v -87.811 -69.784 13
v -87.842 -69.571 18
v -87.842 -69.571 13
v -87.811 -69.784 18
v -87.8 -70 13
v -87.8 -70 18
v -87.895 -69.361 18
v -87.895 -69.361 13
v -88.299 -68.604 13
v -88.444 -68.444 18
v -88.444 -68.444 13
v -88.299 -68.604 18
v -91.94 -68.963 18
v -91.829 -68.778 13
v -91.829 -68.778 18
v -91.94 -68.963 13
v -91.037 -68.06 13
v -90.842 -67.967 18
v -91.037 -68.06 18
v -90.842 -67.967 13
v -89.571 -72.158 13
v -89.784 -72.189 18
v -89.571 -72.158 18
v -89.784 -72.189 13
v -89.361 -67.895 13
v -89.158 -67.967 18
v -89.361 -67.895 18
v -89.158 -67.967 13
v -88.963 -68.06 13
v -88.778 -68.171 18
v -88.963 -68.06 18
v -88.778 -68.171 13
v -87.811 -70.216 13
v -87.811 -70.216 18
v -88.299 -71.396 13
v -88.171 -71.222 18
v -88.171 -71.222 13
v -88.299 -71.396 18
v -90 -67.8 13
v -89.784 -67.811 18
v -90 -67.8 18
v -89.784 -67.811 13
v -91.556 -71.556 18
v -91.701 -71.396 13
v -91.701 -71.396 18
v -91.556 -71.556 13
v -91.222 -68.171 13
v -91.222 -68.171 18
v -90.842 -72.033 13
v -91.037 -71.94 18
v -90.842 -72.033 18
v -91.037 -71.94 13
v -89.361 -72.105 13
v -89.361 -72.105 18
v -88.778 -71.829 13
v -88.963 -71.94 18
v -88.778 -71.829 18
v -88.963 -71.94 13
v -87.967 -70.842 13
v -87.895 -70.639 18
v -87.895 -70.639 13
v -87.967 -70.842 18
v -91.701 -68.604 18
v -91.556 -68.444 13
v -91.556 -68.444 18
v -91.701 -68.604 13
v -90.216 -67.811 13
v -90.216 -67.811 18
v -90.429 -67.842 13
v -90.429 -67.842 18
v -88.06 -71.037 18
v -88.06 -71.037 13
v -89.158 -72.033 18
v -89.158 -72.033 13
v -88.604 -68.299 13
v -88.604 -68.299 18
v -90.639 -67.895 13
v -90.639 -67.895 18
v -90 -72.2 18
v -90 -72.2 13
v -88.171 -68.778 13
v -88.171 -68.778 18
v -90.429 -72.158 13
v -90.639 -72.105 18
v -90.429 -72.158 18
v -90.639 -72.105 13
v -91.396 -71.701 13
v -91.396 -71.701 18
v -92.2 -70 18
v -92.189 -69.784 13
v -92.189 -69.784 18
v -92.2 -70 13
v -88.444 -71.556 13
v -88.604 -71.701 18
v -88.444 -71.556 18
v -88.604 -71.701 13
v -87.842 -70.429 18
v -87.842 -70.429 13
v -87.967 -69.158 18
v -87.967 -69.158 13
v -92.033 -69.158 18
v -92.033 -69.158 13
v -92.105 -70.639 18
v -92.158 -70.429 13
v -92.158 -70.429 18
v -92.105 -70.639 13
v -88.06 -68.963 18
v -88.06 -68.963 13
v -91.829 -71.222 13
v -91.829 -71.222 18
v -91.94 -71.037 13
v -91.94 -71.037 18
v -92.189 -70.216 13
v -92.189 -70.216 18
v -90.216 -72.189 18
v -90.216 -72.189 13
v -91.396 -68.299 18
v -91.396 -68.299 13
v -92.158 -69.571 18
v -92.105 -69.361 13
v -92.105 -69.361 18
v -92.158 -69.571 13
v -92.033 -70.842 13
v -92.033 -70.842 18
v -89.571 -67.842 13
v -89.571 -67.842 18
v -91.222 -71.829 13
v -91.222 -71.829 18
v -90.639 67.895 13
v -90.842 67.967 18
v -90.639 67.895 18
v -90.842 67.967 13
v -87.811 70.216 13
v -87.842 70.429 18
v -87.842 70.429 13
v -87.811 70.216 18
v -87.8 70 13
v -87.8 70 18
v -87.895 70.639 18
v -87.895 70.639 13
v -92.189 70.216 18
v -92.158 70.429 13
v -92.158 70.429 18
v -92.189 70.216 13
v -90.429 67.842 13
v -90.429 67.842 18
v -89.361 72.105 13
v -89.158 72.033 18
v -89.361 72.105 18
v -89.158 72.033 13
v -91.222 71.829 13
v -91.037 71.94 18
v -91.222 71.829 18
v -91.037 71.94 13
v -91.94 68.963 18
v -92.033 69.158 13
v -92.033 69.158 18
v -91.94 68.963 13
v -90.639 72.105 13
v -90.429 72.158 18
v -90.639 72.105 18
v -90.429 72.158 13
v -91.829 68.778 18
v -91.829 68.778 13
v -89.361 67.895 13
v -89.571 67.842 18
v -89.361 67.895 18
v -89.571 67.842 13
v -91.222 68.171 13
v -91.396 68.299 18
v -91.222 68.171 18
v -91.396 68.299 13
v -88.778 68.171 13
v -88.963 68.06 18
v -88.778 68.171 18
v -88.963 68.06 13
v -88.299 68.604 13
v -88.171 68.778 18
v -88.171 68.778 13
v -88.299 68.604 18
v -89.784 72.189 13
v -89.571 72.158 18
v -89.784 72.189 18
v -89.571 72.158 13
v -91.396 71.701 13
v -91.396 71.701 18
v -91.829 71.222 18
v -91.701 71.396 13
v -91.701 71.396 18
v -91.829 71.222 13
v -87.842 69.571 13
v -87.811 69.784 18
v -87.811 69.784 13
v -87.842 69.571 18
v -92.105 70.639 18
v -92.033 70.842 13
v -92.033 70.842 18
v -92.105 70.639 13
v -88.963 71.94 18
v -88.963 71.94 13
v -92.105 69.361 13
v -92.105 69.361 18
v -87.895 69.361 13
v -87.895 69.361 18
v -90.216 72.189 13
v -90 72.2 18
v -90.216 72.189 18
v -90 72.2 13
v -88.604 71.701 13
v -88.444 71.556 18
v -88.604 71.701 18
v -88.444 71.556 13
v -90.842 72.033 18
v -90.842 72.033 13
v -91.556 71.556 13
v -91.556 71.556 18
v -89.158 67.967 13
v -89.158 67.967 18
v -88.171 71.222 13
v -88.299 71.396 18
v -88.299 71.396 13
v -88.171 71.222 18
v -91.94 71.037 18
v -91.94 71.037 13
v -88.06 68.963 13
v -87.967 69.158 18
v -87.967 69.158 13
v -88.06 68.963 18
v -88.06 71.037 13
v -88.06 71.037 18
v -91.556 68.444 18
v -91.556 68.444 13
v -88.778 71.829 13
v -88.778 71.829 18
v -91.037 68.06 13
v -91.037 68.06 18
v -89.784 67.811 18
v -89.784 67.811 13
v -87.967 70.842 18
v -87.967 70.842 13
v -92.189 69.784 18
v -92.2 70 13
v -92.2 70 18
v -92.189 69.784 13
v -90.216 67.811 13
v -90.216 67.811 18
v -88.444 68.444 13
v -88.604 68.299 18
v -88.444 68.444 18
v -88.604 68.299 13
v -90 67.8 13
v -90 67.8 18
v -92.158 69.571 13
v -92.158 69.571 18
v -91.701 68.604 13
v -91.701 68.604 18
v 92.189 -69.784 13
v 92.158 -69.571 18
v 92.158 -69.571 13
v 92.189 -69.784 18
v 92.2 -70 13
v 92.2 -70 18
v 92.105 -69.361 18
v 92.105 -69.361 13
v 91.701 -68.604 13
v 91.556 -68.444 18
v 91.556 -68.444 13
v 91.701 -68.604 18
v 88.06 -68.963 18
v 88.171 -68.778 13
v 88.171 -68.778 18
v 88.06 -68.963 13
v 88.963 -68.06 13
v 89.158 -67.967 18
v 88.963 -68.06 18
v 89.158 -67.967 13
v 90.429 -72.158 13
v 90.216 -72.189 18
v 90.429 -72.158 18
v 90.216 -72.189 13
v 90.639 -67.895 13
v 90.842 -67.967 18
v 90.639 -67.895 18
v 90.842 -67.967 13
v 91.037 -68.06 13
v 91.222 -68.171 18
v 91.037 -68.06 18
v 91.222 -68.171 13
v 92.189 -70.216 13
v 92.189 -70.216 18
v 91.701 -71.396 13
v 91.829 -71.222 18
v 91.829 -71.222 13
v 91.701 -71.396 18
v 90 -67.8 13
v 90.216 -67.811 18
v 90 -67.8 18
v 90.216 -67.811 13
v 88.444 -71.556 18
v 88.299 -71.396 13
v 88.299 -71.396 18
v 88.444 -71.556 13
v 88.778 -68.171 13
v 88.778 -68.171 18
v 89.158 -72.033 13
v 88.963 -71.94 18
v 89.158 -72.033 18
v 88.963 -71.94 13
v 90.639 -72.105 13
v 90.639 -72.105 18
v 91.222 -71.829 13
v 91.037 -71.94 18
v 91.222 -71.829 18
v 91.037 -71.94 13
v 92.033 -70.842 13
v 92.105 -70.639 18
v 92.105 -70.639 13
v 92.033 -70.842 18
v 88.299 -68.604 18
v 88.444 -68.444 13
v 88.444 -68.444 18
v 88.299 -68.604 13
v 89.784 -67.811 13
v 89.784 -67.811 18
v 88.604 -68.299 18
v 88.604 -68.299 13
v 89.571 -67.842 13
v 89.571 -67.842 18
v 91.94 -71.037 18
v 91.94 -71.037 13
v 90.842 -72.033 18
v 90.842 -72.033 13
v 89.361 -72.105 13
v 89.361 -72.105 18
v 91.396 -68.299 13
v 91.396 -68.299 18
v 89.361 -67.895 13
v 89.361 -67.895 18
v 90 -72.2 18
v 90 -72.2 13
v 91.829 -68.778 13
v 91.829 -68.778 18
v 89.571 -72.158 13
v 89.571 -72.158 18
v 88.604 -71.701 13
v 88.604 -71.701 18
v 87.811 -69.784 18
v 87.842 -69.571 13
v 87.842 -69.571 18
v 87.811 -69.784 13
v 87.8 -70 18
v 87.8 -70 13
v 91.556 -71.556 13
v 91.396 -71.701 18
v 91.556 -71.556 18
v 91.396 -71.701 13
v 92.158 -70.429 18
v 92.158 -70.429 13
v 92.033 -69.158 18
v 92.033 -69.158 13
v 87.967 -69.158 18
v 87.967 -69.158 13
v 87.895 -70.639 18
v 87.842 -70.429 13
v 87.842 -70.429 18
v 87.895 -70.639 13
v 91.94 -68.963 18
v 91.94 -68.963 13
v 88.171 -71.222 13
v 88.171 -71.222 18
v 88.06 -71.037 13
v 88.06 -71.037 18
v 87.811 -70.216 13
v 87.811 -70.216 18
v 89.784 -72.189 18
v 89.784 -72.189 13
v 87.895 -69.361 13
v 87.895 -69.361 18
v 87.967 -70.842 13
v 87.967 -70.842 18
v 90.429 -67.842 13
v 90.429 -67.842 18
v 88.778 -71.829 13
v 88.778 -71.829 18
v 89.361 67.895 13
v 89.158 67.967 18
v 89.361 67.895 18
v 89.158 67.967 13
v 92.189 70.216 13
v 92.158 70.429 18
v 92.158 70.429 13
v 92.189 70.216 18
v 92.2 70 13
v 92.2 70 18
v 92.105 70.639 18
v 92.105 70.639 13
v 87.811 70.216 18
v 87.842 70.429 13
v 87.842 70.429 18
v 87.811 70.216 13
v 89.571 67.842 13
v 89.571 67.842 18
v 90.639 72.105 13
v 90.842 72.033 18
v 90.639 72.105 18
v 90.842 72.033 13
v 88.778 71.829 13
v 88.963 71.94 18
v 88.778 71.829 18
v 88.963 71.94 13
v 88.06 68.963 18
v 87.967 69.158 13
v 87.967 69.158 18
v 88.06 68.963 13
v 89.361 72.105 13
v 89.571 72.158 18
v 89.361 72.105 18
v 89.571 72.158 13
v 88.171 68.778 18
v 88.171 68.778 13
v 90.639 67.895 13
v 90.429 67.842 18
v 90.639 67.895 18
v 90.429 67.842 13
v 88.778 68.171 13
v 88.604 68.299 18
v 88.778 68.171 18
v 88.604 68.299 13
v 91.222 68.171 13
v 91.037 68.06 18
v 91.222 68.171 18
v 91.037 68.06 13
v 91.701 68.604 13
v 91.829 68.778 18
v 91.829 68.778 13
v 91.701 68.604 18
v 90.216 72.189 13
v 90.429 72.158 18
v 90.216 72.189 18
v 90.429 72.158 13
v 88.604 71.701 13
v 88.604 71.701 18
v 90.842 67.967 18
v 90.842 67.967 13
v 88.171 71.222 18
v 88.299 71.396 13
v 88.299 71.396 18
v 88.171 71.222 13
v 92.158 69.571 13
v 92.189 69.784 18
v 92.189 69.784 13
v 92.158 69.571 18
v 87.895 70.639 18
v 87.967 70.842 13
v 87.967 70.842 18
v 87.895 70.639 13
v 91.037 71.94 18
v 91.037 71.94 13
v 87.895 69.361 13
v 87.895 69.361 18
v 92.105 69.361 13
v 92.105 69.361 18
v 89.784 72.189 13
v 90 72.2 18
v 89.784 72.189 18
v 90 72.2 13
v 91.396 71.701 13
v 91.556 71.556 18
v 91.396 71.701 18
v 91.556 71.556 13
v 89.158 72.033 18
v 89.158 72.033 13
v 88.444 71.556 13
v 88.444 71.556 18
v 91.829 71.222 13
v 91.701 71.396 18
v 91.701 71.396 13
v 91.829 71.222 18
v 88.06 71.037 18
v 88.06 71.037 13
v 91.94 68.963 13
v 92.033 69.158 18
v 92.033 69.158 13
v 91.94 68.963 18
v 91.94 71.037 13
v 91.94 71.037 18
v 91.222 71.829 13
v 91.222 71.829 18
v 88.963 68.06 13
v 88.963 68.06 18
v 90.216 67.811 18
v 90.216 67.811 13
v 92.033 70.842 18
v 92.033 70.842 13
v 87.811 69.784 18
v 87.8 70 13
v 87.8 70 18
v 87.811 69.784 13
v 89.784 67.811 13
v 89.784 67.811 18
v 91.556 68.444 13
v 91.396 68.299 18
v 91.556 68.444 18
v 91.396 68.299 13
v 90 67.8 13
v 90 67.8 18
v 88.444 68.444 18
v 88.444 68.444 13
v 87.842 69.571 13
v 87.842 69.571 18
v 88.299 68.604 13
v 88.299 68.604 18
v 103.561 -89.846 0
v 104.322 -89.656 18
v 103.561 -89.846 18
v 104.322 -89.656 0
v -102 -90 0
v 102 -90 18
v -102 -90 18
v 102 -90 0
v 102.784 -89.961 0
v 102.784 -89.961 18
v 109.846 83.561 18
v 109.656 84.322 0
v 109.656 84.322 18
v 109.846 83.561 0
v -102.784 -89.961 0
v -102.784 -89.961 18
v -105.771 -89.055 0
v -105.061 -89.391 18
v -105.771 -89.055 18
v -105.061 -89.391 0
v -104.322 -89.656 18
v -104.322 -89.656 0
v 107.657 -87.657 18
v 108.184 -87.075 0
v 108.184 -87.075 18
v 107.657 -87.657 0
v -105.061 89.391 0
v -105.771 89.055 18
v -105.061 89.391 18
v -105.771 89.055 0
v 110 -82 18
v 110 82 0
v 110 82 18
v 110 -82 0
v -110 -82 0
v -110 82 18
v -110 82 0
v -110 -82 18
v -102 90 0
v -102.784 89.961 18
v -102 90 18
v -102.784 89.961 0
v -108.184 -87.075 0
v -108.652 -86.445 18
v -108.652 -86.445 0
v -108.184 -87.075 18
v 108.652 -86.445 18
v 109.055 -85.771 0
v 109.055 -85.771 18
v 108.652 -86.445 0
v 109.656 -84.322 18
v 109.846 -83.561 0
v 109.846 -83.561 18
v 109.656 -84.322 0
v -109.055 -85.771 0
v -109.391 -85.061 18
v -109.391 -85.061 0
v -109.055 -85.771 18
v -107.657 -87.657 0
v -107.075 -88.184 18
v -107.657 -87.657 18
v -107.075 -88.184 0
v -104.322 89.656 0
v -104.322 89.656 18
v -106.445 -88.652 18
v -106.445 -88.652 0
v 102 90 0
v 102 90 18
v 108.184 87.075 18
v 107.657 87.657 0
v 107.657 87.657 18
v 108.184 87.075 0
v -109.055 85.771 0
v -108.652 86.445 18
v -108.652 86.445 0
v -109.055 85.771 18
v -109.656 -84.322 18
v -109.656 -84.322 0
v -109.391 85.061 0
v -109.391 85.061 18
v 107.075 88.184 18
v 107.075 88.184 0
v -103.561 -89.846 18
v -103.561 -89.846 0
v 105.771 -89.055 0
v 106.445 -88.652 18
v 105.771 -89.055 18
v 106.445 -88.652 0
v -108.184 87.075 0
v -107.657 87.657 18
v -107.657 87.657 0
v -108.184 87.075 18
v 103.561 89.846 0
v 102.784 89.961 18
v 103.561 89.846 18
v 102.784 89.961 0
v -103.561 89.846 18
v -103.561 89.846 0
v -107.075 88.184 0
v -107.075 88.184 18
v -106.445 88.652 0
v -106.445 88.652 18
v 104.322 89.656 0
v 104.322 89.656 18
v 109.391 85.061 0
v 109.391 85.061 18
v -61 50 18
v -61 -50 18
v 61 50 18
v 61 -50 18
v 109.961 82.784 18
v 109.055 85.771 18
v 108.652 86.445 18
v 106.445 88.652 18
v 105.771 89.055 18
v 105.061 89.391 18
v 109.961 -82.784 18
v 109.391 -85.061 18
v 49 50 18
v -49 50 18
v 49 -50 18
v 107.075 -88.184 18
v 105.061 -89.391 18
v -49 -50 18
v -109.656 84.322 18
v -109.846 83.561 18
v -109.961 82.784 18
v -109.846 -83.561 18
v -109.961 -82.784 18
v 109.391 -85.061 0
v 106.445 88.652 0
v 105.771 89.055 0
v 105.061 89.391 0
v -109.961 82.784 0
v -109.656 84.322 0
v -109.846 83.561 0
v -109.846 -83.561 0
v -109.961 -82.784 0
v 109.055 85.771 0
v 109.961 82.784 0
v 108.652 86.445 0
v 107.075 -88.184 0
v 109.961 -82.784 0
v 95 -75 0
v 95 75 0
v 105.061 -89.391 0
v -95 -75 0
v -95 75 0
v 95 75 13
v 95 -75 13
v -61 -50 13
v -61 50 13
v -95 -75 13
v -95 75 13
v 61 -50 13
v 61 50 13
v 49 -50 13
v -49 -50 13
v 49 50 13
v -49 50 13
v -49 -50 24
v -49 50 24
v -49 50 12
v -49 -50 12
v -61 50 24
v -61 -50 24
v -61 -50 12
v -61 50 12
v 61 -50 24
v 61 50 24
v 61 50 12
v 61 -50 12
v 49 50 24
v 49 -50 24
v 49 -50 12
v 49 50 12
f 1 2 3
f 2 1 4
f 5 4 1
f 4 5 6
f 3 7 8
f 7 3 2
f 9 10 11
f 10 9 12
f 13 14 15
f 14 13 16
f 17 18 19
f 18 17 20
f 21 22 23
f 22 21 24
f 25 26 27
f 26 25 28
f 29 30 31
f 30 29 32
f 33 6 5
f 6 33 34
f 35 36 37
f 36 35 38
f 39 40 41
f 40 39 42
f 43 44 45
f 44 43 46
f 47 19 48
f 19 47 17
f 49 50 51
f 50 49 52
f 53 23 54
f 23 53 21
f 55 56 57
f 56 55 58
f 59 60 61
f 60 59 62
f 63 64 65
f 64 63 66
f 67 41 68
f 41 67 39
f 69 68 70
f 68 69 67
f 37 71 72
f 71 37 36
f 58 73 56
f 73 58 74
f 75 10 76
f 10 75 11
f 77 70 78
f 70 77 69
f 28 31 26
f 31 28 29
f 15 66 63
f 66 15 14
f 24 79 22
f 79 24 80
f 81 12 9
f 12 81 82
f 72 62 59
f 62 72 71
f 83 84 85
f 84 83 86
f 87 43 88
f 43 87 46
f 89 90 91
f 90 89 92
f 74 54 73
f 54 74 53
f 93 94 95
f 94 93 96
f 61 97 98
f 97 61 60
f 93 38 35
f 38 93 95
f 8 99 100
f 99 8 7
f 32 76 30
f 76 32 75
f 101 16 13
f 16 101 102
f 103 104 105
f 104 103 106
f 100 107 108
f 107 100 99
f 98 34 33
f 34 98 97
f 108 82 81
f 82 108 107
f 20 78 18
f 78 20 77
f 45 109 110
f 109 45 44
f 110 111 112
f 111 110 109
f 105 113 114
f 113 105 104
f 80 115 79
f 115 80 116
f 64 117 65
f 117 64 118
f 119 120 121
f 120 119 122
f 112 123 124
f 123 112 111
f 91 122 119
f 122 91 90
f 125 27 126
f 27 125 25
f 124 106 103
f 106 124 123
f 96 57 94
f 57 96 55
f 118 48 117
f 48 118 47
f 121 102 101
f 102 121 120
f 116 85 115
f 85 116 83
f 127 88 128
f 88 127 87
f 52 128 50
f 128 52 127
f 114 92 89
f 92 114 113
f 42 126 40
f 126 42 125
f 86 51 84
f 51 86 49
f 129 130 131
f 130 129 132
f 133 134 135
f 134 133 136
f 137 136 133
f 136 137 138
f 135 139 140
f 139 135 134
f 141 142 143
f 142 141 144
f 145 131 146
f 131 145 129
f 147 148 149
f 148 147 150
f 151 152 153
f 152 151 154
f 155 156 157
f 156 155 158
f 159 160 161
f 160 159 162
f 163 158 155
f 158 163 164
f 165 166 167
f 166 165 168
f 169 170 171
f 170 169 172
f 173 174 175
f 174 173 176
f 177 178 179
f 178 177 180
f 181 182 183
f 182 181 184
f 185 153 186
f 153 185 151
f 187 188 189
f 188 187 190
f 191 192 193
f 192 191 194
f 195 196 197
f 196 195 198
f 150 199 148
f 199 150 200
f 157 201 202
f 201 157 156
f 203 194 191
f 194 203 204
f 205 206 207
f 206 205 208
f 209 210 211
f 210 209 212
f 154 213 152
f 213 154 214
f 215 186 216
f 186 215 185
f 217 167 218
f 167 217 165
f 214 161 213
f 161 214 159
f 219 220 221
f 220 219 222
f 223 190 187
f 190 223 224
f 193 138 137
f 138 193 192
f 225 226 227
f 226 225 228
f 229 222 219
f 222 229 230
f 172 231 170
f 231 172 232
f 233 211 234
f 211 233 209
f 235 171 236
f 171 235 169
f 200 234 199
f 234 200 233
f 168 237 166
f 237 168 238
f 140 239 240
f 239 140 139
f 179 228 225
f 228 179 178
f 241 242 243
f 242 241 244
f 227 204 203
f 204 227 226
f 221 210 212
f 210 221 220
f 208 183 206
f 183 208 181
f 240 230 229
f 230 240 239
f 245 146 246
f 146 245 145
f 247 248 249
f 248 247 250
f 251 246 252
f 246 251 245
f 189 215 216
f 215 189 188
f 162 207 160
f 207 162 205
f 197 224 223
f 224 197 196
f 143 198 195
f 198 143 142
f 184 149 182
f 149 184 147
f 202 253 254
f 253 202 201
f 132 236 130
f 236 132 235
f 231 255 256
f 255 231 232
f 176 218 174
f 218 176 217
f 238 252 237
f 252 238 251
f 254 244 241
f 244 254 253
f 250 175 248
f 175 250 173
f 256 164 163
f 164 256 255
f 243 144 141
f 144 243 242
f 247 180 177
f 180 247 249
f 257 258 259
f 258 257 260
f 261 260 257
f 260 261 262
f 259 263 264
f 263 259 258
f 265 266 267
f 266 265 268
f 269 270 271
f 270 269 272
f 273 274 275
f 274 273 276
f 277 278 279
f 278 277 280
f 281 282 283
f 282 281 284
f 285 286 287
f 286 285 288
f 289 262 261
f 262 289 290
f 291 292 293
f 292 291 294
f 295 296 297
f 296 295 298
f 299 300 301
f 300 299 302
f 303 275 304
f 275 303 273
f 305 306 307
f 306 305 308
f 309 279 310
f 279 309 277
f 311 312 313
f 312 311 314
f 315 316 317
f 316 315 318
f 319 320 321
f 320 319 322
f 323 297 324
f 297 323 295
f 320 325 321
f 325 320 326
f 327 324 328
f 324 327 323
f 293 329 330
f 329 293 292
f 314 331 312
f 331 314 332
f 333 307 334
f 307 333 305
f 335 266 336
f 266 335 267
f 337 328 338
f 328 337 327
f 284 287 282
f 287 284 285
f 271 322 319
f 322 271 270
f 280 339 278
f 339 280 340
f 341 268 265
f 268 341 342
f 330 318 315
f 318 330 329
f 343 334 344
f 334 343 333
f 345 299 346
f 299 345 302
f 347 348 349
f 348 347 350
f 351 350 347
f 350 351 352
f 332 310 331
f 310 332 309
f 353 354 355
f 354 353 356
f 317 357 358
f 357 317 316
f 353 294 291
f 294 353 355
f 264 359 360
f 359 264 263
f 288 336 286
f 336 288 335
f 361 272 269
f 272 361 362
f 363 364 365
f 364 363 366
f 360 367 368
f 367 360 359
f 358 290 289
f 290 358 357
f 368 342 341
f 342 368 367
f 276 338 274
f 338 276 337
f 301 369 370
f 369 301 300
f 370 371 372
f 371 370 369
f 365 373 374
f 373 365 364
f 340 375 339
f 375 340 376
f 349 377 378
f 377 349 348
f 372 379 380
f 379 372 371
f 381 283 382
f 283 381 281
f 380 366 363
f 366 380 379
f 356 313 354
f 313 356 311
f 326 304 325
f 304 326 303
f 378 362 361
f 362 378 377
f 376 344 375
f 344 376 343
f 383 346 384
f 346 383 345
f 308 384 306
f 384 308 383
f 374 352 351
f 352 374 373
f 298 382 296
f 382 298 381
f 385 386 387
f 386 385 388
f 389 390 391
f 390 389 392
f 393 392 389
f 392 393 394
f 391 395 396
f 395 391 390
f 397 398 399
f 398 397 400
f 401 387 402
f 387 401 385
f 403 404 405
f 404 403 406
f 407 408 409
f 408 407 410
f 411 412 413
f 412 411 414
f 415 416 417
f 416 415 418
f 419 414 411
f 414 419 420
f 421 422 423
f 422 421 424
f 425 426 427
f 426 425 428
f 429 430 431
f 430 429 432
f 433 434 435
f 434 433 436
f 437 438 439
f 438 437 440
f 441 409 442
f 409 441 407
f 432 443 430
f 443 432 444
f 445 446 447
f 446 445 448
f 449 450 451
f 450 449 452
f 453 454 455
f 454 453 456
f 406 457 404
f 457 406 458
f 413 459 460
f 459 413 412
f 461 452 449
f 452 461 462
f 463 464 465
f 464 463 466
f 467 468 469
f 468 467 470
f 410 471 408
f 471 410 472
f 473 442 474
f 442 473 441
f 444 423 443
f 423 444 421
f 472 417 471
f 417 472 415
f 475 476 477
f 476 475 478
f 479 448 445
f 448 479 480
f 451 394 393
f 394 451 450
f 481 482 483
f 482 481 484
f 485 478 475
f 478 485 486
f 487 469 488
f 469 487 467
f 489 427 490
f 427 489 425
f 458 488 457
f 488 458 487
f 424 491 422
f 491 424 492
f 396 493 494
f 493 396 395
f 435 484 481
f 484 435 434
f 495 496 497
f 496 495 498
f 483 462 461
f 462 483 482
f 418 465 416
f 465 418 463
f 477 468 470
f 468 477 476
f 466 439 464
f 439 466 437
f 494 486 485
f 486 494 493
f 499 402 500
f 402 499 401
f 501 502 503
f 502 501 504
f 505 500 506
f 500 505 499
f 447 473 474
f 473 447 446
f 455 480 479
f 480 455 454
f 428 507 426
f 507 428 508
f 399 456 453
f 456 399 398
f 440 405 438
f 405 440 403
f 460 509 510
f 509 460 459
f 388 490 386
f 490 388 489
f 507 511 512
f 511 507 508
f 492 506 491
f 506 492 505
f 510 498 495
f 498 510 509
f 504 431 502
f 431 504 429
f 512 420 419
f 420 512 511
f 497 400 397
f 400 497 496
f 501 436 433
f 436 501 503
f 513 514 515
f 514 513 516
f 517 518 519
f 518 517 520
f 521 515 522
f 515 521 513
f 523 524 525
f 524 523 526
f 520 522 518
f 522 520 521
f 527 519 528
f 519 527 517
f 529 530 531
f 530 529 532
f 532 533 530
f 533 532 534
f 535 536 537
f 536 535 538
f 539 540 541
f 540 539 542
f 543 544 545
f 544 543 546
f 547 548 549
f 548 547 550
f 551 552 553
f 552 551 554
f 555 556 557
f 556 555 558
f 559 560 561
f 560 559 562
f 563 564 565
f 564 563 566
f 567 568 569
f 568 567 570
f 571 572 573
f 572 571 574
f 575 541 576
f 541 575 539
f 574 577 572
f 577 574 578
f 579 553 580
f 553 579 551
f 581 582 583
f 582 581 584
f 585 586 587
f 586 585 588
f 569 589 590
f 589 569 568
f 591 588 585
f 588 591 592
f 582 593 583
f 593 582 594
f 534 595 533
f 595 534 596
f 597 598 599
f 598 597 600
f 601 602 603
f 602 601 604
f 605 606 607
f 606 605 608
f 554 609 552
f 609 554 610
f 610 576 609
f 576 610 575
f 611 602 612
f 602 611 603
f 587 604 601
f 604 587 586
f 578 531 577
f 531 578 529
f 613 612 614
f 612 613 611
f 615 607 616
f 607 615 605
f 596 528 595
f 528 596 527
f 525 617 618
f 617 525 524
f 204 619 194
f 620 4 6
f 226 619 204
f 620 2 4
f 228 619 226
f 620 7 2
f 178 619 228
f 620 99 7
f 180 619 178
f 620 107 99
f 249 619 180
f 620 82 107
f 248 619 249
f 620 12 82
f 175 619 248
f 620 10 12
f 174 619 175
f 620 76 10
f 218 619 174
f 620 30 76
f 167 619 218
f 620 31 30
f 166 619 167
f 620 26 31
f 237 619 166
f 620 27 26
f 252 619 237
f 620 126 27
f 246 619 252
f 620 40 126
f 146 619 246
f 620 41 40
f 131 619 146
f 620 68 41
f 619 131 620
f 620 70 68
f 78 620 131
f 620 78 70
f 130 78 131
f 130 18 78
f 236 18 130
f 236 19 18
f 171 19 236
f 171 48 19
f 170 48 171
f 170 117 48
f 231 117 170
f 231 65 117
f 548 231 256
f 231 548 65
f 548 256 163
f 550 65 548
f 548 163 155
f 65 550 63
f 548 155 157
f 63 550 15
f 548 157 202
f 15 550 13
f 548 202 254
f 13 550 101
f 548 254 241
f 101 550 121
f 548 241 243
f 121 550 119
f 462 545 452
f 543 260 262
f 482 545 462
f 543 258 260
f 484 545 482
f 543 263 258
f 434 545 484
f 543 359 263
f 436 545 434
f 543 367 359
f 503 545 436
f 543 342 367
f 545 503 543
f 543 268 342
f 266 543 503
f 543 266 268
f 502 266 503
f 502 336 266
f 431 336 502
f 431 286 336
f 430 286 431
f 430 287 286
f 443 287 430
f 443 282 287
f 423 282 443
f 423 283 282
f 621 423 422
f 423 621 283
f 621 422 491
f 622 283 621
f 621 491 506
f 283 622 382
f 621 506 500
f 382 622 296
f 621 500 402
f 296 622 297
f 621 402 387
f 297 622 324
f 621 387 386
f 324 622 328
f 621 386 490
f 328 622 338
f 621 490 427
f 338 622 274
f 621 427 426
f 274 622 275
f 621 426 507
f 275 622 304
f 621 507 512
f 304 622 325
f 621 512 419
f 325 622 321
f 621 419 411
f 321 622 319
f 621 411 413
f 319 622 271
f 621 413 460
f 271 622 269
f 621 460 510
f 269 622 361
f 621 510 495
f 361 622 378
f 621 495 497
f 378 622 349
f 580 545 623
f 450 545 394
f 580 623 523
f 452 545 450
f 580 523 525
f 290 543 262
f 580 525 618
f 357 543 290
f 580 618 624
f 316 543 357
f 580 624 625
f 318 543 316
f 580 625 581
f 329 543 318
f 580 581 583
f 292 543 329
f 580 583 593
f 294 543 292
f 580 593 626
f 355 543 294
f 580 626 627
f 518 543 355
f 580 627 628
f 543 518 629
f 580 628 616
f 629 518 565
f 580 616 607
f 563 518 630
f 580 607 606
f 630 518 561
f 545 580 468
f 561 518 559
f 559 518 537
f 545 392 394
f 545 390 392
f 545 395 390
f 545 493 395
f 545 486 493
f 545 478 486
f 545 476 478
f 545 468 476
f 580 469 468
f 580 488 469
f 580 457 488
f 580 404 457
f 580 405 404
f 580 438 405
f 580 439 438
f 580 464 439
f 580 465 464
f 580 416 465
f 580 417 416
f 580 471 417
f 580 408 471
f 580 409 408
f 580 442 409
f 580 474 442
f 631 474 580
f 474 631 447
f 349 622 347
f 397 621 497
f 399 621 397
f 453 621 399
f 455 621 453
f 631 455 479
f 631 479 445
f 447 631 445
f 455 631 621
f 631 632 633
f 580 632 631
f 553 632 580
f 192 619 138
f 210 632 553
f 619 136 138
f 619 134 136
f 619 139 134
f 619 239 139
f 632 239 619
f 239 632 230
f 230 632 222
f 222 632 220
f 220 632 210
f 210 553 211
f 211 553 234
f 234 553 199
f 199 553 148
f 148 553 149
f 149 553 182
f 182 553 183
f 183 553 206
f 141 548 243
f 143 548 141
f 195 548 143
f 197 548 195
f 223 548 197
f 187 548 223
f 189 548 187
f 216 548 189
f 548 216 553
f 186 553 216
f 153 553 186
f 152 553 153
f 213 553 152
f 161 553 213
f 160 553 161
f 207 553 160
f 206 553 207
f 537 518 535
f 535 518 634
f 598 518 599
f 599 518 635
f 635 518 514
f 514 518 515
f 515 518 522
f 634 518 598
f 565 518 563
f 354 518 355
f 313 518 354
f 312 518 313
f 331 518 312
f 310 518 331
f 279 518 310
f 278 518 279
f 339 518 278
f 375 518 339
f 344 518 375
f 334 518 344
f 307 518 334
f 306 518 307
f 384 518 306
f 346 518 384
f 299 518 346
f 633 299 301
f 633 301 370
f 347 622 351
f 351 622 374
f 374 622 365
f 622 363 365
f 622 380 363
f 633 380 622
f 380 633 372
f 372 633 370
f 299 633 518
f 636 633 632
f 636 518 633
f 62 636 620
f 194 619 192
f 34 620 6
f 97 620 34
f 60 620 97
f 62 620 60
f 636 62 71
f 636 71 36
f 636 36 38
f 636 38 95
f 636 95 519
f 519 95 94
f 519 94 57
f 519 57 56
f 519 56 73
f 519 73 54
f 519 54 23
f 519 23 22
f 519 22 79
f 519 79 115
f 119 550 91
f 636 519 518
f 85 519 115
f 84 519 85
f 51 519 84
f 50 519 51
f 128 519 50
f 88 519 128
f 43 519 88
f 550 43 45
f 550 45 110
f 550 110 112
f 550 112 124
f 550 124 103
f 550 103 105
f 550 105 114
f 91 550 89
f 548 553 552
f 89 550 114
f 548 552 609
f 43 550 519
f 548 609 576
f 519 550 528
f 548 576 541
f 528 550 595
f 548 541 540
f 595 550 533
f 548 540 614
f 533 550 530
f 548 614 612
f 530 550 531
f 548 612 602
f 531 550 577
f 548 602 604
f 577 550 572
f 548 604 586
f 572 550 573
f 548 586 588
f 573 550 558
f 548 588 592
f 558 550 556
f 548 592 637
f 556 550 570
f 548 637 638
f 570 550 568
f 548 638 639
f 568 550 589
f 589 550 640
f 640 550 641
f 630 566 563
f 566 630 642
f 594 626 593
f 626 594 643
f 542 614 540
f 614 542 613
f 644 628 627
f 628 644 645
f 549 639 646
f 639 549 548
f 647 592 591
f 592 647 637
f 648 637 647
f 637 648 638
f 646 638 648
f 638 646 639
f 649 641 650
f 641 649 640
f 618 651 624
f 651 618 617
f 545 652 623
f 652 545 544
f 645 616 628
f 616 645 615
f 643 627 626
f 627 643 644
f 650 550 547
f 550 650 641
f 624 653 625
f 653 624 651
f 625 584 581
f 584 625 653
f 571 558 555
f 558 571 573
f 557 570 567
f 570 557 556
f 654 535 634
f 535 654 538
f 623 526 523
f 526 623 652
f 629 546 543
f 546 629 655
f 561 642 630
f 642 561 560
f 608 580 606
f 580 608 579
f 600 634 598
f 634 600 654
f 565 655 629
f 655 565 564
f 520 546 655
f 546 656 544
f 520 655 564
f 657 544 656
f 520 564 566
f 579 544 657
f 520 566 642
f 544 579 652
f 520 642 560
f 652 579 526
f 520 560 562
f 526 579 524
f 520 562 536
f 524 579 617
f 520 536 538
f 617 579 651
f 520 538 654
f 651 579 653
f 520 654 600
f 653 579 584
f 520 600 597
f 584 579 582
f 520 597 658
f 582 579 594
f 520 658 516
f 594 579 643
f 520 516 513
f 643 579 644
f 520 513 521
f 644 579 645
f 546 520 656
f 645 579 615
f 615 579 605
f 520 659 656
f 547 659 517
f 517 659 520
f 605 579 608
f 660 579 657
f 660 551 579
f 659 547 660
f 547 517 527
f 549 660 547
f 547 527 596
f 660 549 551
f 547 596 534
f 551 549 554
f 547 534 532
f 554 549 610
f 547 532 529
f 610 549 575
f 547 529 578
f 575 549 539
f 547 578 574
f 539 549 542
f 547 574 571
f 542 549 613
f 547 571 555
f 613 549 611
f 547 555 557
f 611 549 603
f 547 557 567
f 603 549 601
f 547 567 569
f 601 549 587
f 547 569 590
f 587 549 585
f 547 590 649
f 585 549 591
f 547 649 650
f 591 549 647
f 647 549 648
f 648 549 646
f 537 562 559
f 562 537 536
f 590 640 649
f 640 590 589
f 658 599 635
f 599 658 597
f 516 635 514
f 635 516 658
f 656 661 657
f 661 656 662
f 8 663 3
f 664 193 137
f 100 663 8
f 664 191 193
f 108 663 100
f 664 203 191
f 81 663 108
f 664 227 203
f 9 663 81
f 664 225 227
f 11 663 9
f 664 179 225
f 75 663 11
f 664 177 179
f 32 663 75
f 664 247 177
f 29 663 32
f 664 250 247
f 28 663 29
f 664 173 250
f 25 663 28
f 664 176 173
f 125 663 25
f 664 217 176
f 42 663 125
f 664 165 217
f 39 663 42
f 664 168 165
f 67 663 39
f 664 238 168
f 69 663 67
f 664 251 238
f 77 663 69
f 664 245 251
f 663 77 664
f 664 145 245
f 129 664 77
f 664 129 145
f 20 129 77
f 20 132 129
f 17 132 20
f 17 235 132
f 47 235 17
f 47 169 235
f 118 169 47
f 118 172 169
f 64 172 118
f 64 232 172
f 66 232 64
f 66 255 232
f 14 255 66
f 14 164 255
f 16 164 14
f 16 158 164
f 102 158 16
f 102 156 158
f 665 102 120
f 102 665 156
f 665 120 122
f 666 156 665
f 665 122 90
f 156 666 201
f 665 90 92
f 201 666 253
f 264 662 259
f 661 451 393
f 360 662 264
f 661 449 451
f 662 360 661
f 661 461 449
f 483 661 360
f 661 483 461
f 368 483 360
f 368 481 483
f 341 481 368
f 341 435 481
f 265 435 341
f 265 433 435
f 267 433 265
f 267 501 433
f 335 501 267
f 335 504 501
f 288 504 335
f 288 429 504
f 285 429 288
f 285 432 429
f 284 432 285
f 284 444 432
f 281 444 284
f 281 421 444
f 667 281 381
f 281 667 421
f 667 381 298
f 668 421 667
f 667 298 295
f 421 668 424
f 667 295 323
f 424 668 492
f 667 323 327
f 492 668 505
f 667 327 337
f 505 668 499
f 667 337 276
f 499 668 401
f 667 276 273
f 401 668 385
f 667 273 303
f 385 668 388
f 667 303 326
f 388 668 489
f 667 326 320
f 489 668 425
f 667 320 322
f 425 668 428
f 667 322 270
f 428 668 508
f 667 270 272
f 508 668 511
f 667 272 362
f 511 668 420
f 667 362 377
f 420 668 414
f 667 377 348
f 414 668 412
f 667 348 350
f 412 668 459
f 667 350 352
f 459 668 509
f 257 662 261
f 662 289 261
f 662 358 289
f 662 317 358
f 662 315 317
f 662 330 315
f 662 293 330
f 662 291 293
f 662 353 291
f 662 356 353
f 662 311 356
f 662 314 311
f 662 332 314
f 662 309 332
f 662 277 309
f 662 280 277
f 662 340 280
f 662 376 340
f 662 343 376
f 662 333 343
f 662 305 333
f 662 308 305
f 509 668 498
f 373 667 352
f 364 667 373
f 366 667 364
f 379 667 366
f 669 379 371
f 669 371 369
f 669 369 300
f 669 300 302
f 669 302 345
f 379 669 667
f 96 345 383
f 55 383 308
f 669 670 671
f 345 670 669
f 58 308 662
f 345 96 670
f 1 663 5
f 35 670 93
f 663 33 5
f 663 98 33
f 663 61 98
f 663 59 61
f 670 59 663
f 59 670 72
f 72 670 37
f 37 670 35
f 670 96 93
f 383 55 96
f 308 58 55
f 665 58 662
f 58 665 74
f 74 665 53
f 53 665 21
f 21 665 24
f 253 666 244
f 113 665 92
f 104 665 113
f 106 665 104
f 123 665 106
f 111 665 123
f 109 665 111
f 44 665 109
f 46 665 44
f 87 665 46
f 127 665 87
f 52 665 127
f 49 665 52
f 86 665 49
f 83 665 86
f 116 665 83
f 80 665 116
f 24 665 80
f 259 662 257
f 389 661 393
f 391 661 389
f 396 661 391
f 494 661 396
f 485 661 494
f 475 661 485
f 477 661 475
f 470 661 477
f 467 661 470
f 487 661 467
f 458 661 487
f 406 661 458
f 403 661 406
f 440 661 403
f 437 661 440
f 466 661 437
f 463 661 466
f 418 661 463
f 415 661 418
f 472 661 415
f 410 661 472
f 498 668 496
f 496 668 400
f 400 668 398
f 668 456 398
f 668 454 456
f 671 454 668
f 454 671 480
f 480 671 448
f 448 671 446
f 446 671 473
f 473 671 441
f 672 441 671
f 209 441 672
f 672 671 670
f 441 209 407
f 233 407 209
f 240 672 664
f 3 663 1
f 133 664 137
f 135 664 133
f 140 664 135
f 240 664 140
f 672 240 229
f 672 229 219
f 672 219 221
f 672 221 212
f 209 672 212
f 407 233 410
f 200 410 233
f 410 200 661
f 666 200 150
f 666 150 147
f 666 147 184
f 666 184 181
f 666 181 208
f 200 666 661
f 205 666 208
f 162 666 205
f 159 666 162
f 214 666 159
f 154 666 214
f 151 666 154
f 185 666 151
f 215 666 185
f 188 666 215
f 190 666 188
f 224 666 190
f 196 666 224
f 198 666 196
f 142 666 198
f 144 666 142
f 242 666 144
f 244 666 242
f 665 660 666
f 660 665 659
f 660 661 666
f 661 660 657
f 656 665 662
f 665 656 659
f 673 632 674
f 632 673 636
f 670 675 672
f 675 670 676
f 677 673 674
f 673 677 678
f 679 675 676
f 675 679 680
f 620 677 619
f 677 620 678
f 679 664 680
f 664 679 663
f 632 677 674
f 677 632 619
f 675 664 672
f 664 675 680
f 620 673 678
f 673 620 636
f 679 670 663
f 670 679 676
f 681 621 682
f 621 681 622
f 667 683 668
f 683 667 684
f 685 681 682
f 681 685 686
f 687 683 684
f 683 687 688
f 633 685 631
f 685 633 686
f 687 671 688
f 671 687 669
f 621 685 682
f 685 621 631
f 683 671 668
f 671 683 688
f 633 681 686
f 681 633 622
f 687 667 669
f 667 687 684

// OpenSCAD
// file: parameters.scad
// 135er Universal Helicopter Controller - Cyclic V1 parameters
$fn = 64;

base_x = 220;
base_y = 180;
base_h = 18;
wall = 5;

shaft_d = 8.2;
bearing_od = 22.2;
bearing_w = 7.2;

gimbal_outer_x = 120;
gimbal_outer_y = 100;
gimbal_bar = 18;
gimbal_h = 18;

tube_od = 22.2;
tube_clamp_wall = 6;

sensor_board_x = 23;
sensor_board_y = 23;
sensor_gap = 2.0;

m4_clearance = 4.4;
m3_clearance = 3.4;
// main file
include <parameters.scad>;

module rounded_plate(x,y,h,r=6){
    linear_extrude(height=h)
        offset(r=r)
            offset(delta=-r)
                square([x,y], center=true);
}

module mounting_holes(){
    for (x=[-90,90])
        for (y=[-70,70])
            translate([x,y,-1])
                cylinder(h=base_h+2,d=m4_clearance);
}

difference(){
    rounded_plate(base_x,base_y,base_h,8);

    // Service cavity leaves structural perimeter.
    translate([0,0,4])
        cube([base_x-2*wall-20,base_y-2*wall-20,base_h],center=true);

    mounting_holes();
}

// Simple central gimbal mounting rails.
for (x=[-55,55])
    translate([x,0,base_h])
        cube([12,100,12],center=true);
